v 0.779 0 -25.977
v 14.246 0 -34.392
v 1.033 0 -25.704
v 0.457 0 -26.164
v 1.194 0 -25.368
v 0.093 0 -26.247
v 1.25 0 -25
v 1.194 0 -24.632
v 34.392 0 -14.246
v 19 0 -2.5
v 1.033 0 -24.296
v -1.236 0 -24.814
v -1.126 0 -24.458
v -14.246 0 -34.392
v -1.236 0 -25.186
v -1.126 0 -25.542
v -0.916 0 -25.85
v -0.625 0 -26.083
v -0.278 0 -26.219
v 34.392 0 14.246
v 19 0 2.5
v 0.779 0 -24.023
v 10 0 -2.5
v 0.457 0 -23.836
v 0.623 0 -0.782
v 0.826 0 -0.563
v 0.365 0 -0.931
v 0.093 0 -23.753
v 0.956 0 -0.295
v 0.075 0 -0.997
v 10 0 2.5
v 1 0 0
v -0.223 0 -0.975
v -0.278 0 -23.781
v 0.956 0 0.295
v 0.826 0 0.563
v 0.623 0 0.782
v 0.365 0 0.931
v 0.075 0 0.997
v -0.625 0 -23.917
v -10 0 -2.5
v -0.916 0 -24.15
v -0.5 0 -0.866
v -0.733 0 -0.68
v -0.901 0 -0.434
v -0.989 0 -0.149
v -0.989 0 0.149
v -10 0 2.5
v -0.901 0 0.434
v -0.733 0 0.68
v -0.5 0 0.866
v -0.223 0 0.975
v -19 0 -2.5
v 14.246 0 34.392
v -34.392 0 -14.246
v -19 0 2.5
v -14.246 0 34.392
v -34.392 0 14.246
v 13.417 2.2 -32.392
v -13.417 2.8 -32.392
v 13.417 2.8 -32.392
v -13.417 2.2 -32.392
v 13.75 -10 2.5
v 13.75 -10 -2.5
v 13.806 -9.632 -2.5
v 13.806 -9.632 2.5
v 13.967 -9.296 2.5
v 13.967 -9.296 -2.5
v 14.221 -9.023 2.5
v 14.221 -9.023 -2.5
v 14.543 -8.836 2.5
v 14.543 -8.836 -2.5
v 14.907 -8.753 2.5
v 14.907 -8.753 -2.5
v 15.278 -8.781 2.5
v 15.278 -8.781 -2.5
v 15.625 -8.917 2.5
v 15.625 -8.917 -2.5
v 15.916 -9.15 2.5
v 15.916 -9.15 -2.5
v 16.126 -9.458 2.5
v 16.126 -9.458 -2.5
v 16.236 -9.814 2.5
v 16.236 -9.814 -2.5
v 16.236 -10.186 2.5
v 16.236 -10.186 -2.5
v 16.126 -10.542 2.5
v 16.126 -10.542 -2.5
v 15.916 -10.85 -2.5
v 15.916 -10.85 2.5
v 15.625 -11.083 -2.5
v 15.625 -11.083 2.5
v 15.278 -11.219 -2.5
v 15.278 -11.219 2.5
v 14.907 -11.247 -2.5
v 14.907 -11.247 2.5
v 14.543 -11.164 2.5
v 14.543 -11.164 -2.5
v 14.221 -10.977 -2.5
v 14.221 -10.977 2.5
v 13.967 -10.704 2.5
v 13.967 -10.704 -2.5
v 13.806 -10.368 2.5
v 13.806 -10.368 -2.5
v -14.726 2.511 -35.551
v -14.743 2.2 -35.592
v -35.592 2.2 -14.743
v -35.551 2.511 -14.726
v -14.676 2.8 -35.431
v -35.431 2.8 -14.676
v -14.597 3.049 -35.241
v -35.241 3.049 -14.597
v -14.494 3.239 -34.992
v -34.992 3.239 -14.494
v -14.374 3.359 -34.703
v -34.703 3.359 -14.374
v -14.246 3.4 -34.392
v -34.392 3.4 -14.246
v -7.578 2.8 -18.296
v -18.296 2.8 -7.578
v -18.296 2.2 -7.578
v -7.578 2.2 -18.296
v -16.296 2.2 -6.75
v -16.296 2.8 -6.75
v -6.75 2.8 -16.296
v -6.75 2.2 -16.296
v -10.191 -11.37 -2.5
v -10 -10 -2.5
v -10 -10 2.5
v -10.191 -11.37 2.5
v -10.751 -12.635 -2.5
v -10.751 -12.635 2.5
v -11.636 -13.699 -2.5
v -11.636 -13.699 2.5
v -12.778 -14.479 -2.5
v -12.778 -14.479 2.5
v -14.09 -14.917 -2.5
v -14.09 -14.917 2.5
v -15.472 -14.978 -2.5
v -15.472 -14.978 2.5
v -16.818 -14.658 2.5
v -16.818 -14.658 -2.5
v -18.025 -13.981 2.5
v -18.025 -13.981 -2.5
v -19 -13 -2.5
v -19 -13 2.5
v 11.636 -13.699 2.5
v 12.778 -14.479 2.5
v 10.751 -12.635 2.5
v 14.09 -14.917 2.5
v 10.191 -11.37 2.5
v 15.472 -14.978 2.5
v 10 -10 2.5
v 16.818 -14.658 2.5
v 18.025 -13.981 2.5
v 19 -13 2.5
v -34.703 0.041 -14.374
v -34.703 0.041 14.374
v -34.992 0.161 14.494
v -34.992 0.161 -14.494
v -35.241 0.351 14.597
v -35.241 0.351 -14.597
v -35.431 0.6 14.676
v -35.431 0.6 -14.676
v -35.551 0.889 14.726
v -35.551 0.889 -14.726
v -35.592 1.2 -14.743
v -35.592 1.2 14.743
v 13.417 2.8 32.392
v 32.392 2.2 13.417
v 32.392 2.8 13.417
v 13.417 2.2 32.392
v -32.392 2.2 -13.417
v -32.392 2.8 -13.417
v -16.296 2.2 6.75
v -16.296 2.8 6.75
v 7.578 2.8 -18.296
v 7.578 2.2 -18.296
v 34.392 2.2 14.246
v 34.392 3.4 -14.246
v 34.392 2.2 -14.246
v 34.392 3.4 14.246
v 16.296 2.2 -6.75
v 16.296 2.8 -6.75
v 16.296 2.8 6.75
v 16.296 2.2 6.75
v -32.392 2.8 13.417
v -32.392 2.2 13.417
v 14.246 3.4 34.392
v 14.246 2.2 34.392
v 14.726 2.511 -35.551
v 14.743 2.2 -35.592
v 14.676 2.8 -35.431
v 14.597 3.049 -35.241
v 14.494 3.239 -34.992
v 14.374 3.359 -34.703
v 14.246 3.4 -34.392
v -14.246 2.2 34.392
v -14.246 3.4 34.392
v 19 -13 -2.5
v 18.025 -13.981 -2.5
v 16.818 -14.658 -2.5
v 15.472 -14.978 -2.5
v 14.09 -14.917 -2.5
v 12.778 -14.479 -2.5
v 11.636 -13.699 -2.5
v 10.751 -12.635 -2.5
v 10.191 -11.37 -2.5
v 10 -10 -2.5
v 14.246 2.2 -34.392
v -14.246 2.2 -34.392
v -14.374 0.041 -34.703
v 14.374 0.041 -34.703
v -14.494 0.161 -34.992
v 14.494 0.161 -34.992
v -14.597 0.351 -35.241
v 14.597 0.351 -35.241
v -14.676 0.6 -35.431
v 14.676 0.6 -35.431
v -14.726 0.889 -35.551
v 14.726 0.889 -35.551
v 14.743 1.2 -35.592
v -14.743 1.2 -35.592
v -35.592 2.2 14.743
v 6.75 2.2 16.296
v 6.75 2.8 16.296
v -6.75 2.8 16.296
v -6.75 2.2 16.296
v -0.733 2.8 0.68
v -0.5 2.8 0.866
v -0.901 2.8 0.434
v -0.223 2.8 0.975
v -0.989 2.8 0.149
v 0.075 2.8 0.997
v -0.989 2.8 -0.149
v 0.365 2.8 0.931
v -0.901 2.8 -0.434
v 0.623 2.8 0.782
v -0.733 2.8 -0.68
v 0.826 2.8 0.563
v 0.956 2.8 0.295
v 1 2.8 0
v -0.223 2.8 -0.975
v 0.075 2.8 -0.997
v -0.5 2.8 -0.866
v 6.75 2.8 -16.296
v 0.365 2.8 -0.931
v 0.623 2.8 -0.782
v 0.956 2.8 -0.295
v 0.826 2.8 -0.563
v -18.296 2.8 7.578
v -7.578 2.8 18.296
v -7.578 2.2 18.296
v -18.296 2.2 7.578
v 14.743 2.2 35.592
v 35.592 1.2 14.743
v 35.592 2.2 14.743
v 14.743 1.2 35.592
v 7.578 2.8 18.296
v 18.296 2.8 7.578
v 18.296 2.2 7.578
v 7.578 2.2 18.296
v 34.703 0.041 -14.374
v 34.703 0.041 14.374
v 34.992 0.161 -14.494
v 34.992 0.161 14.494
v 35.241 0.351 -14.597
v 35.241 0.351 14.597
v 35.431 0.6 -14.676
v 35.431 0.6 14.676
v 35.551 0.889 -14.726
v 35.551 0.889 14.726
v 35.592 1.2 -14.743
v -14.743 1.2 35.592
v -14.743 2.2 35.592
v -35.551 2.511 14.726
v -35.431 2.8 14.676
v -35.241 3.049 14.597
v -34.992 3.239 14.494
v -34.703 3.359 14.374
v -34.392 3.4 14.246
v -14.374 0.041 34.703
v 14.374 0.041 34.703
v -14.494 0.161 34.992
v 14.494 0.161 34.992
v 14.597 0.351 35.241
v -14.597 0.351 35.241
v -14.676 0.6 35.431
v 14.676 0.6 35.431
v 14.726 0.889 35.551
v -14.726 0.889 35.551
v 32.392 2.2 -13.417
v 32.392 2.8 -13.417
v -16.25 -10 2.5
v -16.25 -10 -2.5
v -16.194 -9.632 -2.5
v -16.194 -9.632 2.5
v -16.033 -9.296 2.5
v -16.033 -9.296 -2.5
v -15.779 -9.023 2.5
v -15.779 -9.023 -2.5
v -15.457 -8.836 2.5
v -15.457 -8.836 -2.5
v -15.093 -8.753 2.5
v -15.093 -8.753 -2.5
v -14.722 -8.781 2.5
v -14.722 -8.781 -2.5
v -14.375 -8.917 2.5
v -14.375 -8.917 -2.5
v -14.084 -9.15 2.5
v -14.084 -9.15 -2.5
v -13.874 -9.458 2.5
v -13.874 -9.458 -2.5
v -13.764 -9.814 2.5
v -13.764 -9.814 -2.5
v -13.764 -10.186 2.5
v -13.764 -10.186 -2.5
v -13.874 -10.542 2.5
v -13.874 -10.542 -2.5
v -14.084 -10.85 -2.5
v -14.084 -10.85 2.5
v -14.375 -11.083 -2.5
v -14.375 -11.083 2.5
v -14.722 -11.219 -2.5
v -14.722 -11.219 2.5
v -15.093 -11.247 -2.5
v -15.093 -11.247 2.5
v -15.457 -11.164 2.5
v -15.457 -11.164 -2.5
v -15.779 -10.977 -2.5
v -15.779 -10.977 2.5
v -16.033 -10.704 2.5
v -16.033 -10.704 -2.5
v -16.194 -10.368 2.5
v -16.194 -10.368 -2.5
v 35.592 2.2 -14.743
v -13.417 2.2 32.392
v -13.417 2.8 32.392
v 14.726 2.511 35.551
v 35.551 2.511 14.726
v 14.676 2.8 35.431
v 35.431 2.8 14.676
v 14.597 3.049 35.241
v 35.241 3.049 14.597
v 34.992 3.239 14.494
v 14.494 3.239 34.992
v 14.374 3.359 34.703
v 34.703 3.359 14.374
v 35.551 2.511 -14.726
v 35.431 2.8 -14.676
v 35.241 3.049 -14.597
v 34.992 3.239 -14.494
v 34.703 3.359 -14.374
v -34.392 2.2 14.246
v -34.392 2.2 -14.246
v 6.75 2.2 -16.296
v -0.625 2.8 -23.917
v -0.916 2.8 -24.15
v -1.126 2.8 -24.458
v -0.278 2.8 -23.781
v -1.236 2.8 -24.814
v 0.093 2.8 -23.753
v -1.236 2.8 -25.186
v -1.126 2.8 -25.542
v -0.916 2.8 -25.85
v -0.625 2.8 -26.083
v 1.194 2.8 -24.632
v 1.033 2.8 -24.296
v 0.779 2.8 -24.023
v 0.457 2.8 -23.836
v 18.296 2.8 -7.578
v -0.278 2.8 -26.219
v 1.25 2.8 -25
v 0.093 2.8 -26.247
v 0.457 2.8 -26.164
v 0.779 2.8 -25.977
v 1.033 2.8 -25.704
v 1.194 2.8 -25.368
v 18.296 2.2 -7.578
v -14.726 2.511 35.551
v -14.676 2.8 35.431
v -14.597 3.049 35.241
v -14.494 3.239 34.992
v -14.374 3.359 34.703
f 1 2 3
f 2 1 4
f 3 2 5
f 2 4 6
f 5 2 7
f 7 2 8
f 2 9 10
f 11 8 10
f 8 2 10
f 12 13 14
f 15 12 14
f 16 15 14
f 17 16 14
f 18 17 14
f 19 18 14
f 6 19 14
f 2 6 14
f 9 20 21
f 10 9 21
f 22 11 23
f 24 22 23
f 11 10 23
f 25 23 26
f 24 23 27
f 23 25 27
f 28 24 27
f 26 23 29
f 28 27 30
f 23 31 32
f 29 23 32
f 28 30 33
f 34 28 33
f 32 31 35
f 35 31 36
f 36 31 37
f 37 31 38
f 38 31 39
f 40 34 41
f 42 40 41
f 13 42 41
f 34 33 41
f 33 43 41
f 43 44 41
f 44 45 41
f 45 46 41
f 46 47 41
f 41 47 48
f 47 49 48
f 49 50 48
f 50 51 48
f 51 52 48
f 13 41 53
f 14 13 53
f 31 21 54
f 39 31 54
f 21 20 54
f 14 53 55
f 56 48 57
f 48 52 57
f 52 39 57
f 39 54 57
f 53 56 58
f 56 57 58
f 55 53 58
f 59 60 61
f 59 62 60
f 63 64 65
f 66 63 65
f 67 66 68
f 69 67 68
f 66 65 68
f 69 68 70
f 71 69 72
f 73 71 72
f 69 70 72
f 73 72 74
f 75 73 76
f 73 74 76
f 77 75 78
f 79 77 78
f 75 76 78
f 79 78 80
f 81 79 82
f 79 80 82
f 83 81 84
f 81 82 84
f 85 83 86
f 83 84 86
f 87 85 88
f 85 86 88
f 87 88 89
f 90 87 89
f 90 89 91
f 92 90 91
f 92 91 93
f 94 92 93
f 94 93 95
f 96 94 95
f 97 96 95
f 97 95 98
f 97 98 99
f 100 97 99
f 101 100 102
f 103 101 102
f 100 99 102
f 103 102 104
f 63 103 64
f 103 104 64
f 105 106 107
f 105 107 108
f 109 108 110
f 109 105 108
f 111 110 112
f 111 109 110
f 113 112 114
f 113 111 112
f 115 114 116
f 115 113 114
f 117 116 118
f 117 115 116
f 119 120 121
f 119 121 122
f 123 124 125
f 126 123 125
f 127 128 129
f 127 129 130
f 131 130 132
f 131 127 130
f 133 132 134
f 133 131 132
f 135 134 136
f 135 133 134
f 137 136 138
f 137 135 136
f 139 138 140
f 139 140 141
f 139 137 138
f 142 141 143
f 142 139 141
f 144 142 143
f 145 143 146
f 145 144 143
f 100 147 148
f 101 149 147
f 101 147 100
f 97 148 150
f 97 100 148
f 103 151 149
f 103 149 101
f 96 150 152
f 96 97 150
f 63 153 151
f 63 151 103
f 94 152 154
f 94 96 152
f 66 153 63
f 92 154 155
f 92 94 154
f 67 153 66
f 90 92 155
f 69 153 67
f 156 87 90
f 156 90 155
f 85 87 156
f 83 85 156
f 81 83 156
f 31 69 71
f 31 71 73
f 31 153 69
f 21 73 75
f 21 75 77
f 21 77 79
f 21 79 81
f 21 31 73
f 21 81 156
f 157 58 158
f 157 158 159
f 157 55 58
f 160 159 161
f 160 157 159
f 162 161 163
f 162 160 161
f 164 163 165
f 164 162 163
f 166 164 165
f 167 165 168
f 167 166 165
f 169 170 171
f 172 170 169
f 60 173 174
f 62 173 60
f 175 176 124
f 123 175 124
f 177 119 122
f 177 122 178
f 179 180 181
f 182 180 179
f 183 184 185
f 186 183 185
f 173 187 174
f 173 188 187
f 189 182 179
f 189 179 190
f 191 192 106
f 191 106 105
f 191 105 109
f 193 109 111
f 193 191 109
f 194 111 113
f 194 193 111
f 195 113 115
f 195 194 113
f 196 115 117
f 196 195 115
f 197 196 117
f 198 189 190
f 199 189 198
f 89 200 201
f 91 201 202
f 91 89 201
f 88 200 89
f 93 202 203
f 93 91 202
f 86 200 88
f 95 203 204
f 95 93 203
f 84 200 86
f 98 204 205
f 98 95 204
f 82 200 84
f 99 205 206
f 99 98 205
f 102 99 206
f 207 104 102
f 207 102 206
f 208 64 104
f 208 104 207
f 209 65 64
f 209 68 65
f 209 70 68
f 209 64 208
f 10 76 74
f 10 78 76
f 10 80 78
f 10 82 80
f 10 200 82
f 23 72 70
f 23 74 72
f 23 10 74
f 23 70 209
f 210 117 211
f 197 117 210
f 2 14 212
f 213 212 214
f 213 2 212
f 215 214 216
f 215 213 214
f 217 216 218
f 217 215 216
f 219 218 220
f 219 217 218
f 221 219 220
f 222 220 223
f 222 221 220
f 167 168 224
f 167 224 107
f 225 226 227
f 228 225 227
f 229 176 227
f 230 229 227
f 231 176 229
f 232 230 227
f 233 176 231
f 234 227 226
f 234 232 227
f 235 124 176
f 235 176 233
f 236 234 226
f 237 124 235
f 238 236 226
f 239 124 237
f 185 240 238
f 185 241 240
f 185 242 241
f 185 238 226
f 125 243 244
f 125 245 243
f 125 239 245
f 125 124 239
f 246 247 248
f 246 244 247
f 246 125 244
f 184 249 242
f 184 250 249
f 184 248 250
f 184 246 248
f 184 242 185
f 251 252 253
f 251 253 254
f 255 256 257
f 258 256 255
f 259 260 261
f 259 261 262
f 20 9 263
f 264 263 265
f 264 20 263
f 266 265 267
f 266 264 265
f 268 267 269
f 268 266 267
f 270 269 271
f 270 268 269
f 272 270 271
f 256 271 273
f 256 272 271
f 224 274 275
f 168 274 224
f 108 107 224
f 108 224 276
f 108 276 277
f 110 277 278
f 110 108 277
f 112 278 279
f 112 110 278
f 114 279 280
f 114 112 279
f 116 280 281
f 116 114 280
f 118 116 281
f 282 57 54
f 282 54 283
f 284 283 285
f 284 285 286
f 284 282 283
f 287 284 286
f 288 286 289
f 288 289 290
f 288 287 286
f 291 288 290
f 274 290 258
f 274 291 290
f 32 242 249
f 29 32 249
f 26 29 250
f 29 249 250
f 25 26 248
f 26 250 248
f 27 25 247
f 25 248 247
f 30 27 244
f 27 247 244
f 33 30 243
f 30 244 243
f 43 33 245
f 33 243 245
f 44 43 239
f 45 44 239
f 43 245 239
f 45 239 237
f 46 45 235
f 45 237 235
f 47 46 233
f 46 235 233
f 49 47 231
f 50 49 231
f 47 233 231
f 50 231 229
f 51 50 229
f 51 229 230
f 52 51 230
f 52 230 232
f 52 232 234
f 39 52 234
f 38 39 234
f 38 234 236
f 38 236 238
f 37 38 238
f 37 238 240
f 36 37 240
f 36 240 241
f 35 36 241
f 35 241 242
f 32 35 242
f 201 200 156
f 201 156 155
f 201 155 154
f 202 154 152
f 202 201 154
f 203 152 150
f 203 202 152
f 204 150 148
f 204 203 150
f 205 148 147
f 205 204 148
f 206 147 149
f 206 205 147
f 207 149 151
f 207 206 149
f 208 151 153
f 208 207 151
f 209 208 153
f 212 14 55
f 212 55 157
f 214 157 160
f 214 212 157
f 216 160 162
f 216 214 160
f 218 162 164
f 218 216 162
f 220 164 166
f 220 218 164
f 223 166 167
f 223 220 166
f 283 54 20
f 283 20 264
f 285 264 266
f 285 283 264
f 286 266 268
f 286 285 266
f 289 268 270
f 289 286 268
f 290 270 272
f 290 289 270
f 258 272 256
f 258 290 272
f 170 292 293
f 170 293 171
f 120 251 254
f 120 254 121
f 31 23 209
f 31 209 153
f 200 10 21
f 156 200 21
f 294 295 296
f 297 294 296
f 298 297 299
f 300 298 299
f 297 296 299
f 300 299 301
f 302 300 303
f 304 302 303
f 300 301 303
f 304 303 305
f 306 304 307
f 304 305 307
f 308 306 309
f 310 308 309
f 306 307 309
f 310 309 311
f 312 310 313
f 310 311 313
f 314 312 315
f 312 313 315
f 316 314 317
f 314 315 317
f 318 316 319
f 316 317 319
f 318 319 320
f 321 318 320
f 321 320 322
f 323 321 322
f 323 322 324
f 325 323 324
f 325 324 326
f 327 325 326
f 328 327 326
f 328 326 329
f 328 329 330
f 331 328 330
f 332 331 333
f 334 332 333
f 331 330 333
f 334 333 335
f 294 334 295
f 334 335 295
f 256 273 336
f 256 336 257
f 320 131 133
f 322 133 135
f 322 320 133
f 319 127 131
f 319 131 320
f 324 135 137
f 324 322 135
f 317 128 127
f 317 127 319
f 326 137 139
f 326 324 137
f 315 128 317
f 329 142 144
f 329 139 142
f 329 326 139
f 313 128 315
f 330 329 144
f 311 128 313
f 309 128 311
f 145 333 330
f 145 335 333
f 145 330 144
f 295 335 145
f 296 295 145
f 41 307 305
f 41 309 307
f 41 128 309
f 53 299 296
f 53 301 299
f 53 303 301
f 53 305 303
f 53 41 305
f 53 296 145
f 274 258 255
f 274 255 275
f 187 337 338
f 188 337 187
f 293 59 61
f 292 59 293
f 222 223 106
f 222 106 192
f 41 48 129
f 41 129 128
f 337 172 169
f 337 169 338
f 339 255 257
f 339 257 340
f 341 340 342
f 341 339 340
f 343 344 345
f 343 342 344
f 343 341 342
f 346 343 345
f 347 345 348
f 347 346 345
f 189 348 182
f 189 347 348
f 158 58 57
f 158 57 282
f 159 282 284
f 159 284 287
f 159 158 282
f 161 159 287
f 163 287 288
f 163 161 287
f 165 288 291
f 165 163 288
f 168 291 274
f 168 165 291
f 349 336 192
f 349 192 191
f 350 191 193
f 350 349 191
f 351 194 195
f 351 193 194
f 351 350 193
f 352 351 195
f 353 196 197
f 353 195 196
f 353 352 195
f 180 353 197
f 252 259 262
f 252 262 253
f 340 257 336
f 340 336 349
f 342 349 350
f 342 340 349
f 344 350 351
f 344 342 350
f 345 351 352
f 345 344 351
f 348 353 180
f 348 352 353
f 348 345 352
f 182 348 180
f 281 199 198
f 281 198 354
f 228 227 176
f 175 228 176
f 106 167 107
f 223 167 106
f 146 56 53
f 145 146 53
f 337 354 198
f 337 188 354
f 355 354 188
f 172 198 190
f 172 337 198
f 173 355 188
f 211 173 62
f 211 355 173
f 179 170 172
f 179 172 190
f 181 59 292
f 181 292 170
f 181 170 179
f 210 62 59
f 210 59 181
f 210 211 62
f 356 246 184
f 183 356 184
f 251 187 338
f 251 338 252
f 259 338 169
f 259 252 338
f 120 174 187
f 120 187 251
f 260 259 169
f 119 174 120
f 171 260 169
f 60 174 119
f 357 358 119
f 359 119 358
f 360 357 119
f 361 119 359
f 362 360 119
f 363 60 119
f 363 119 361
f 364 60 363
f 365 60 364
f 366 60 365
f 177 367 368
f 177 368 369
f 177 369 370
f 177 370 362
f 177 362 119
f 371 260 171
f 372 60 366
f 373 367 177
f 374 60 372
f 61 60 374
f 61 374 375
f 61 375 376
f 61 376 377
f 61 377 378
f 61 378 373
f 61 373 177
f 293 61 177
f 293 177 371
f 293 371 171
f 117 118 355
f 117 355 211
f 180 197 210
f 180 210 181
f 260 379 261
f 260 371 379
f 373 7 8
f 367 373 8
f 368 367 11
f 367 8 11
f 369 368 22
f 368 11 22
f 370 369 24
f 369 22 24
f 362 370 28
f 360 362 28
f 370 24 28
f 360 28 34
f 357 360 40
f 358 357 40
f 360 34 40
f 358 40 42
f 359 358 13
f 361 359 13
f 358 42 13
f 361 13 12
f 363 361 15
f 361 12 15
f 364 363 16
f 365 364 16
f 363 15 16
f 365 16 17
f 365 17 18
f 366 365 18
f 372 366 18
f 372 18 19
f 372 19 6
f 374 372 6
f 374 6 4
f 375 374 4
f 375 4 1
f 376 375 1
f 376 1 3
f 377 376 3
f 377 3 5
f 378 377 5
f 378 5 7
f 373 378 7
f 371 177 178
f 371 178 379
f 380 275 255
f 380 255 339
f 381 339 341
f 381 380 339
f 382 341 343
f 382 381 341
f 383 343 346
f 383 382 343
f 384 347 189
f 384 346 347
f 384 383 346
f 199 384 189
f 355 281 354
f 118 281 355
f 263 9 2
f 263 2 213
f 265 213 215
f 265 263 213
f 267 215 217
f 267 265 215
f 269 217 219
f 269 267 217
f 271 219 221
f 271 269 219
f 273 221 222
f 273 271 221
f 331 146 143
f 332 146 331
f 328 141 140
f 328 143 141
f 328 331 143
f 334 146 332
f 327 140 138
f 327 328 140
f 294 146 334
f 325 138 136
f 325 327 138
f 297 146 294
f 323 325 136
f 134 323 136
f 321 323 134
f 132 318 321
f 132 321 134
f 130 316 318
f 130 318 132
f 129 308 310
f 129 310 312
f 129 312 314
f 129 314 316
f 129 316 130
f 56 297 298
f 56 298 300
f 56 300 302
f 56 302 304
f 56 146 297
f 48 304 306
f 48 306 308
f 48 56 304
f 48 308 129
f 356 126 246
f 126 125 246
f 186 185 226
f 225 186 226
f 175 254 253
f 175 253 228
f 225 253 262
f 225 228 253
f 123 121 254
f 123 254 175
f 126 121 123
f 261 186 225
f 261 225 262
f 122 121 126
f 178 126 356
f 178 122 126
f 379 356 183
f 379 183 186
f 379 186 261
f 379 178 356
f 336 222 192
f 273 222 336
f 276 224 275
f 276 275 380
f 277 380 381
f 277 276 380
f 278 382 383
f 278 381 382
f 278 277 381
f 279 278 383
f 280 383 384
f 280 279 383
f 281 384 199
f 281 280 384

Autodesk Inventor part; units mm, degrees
ref_plane "YZ Plane" through (0, 0, 0) normal (1, 0, 0) x (0, 1, 0)
ref_plane "XZ Plane" through (0, 0, 0) normal (0, 1, 0) x (-1, 0, 0)
ref_plane "XY Plane" through (0, 0, 0) normal (0, 0, 1) x (1, 0, 0)
sketch "스케치3" plane through (0, 0, 0) normal (0, 1, 0) x (-1, 0, 0)
  line L0 (35.5919, -14.7426) -> (14.7426, -35.5919)
  line L1 (14.7426, -35.5919) -> (-14.7426, -35.5919)
  line L2 (-14.7426, -35.5919) -> (-35.5919, -14.7426)
  line L3 (-35.5919, -14.7426) -> (-35.5919, 14.7426)
  line L4 (-35.5919, 14.7426) -> (-14.7426, 35.5919)
  line L5 (-14.7426, 35.5919) -> (14.7426, 35.5919)
  line L6 (14.7426, 35.5919) -> (35.5919, 14.7426)
  line L7 (35.5919, 14.7426) -> (35.5919, -14.7426)
  line L8 (32.5919, -13.5) -> (13.5, -32.5919)
  line L9 (13.5, -32.5919) -> (-13.5, -32.5919)
  line L10 (-13.5, -32.5919) -> (-32.5919, -13.5)
  line L11 (-32.5919, -13.5) -> (-32.5919, 13.5)
  line L12 (-32.5919, 13.5) -> (-13.5, 32.5919)
  line L13 (-13.5, 32.5919) -> (13.5, 32.5919)
  line L14 (13.5, 32.5919) -> (32.5919, 13.5)
  line L15 (32.5919, 13.5) -> (32.5919, -13.5)
  point P0 (0, 0)
  point P1 (0, 0)
  point P2 (0, 0)
  point P3 (0, 0)
  dimension "d43" = 27
  dimension "d44" = 3
extrude "돌출2" add sketch "스케치3" along normal blind 3.4 contours L0 L1 L2 L3 L4 L5 L6 L7 | L8 L9 L10 L11 L12 L13 L14 L15
sketch "스케치4" plane through (0, 3.4, 0) normal (0, 1, 0) x (1, 0, 0)
  line L0 (13.5, -32.5919) -> (-13.5, -32.5919)
  line L1 (-13.5, -32.5919) -> (-32.5919, -13.5)
  line L2 (-32.5919, -13.5) -> (-32.5919, 13.5)
  line L3 (-32.5919, 13.5) -> (-13.5, 32.5919)
  line L4 (-13.5, 32.5919) -> (13.5, 32.5919)
  line L5 (13.5, 32.5919) -> (32.5919, 13.5)
  line L6 (32.5919, 13.5) -> (32.5919, -13.5)
  line L7 (32.5919, -13.5) -> (13.5, -32.5919)
  line L8 (-14.2456, 34.3919) -> (14.2456, 34.3919)
  line L9 (14.2456, 34.3919) -> (34.3919, 14.2456)
  line L10 (34.3919, 14.2456) -> (34.3919, -14.2456)
  line L11 (34.3919, -14.2456) -> (14.2456, -34.3919)
  line L12 (14.2456, -34.3919) -> (-14.2456, -34.3919)
  line L13 (-14.2456, -34.3919) -> (-34.3919, -14.2456)
  line L14 (-34.3919, -14.2456) -> (-34.3919, 14.2456)
  line L15 (-34.3919, 14.2456) -> (-14.2456, 34.3919)
  line L16 (-13.4172, 32.3919) -> (13.4172, 32.3919)
  line L17 (13.4172, 32.3919) -> (32.3919, 13.4172)
  line L18 (32.3919, 13.4172) -> (32.3919, -13.4172)
  line L19 (32.3919, -13.4172) -> (13.4172, -32.3919)
  line L20 (13.4172, -32.3919) -> (-13.4172, -32.3919)
  line L21 (-13.4172, -32.3919) -> (-32.3919, -13.4172)
  line L22 (-32.3919, -13.4172) -> (-32.3919, 13.4172)
  line L23 (-32.3919, 13.4172) -> (-13.4172, 32.3919)
  point P0 (0, 0)
  point P1 (0, 0)
  point P2 (0, 0)
  point P3 (0, 0)
  dimension "d7" = 27
  dimension "d42" = 1.8
  dimension "d45" = 0.2
extrude "돌출3" cut sketch "스케치4" against normal blind 1.2 contours L0 L1 L2 L3 L4 L5 L6 L7 | L8 L9 L10 L11 L12 L13 L14 L15 | L16 L17 L18 L19 L20 L21 L22 L23
sketch "스케치5" plane through (0, 0, 0) normal (0, -1, 0) x (1, 0, 0)
  line L0 (10, 2.5) -> (20, 2.5)
  line L1 (20, 2.5) -> (20, -2.5)
  line L2 (20, -2.5) -> (10, -2.5)
  line L3 (10, -2.5) -> (10, 2.5)
  line L4 (10, 2.5) -> (20, -2.5) construction
  line L5 (20, 2.5) -> (10, -2.5) construction
  line L6 (-20, 2.5) -> (-10, 2.5)
  line L7 (-10, 2.5) -> (-10, -2.5)
  line L8 (-10, -2.5) -> (-20, -2.5)
  line L9 (-20, -2.5) -> (-20, 2.5)
  line L10 (-20, 2.5) -> (-10, -2.5) construction
  line L11 (-10, 2.5) -> (-20, -2.5) construction
  point P0 (0, 0)
  point P1 (15, 0)
  point P2 (-15, 0)
  dimension "d11" = 10
  dimension "d12" = 5
  dimension "d13" = 10
  dimension "d16" = 30
extrude "돌출4" add sketch "스케치5" along normal blind 10
sketch "스케치6" plane through (-10, 0, -2.5) normal (0, 0, -1) x (-1, 0, 0)
  circle A0 centre (5, -10) radius 5
  circle A1 centre (-25, -10) radius 5
  line L0 (-20, -10) -> (-30, -10) projected
  line L1 (10, -10) -> (0, -10) projected
  point P0 (-10, 0)
  dimension "d23" = 10
  dimension "d24" = 10
extrude "돌출5" add sketch "스케치6" against normal blind 5
sketch "스케치7" plane through (-10, 0, -2.5) normal (0, 0, -1) x (-1, 0, 0)
  circle A0 centre (5, -10) radius 1.25
  line L0 (10, 0) -> (10, -10) projected
  line L1 (0, 0) -> (10, 0) projected
  line L2 (4.7788, 0) -> (0, 0)
  circle A1 centre (-25, -10) radius 1.25
  point P0 (-10, 0)
  dimension "d27" = 2.5
  dimension "d28" = 5
  dimension "d31" = 30
extrude "돌출6" cut sketch "스케치7" against normal blind 5
sketch "스케치8" plane through (0, 0, 0) normal (0, -1, 0) x (1, 0, 0)
  circle A0 centre (0, -25) radius 1.25
  line L0 (-10, 2.5) -> (-10, -2.5) projected
  point P0 (0, 0)
  point P1 (-10, 0)
  dimension "d38" = 2.5
  dimension "d39" = 25
sketch "스케치9" plane through (0, 2.2, 0) normal (0, 1, 0) x (1, 0, 0)
  line L0 (-13.4172, 32.3919) -> (13.4172, 32.3919)
  line L1 (13.4172, 32.3919) -> (32.3919, 13.4172)
  line L2 (32.3919, 13.4172) -> (32.3919, -13.4172)
  line L3 (32.3919, -13.4172) -> (13.4172, -32.3919)
  line L4 (13.4172, -32.3919) -> (-13.4172, -32.3919)
  line L5 (-13.4172, -32.3919) -> (-32.3919, -13.4172)
  line L6 (-32.3919, -13.4172) -> (-32.3919, 13.4172)
  line L7 (-32.3919, 13.4172) -> (-13.4172, 32.3919)
  line L8 (-14.2456, 34.3919) -> (14.2456, 34.3919) projected
  line L9 (-12.1745, 29.3919) -> (12.1745, 29.3919)
  line L10 (12.1745, 29.3919) -> (29.3919, 12.1745)
  line L11 (29.3919, 12.1745) -> (29.3919, -12.1745)
  line L12 (29.3919, -12.1745) -> (12.1745, -29.3919)
  line L13 (12.1745, -29.3919) -> (-12.1745, -29.3919)
  line L14 (-12.1745, -29.3919) -> (-29.3919, -12.1745)
  line L15 (-29.3919, -12.1745) -> (-29.3919, 12.1745)
  line L16 (-29.3919, 12.1745) -> (-12.1745, 29.3919)
  point P0 (0, 0)
  point P1 (0, 0)
  point P2 (0, 0)
  dimension "d46" = 2
  dimension "d47" = 3
extrude "돌출8" add sketch "스케치9" along normal blind 0.6 contours L0 L1 L2 L3 L4 L5 L6 L7 | L9 L10 L11 L12 L13 L14 L15 L16
fillet "모깎기1" radius 1.2 16 edges at (-35.5919, 3.4, 0) (-25.1673, 3.4, 25.1673) (0, 3.4, 35.5919) (25.1673, 3.4, 25.1673) (35.5919, 3.4, 0) (25.1673, 3.4, -25.1673) (0, 3.4, -35.5919) (-25.1673, 3.4, -25.1673) (25.1673, 0, 25.1673) (0, 0, 35.5919) (-25.1673, 0, 25.1673) (-35.5919, 0, 0) (-25.1673, 0, -25.1673) (0, 0, -35.5919) (25.1673, 0, -25.1673) (35.5919, 0, 0)
sketch "스케치10" plane through (0, 0, 0) normal (0, -1, 0) x (1, 0, 0)
  line L0 (-20, 2.5) -> (-10, 2.5) projected
  line L1 (-10, -2.5) -> (-20, -2.5) projected
  line L2 (-20, 2.5) -> (-19, 2.5)
  line L3 (-19, 2.5) -> (-19, -2.5)
  line L4 (-19, -2.5) -> (-20, -2.5)
  line L5 (-20, -2.5) -> (-20, 2.5)
  line L6 (20, -2.5) -> (10, -2.5) projected
  line L7 (10, 2.5) -> (20, 2.5) projected
  line L8 (20, -2.5) -> (19, -2.5)
  line L9 (19, -2.5) -> (19, 2.5)
  line L10 (19, 2.5) -> (20, 2.5)
  line L11 (20, 2.5) -> (20, -2.5)
  point P0 (0, 0)
  dimension "d54" = 1
  dimension "d55" = 1
extrude "돌출9" cut sketch "스케치10" along normal blind 15
extrude "돌출10" cut sketch "스케치8" against normal blind 5
sketch "스케치11" plane through (0, 2.8, 0) normal (0, 1, 0) x (1, 0, 0)
  line L0 (-6.75, 16.2959) -> (6.75, 16.2959)
  line L1 (6.75, 16.2959) -> (16.2959, 6.75)
  line L2 (16.2959, 6.75) -> (16.2959, -6.75)
  line L3 (16.2959, -6.75) -> (6.75, -16.2959)
  line L4 (6.75, -16.2959) -> (-6.75, -16.2959)
  line L5 (-6.75, -16.2959) -> (-16.2959, -6.75)
  line L6 (-16.2959, -6.75) -> (-16.2959, 6.75)
  line L7 (-16.2959, 6.75) -> (-6.75, 16.2959)
  line L8 (-7.5784, 18.2959) -> (7.5784, 18.2959)
  line L9 (7.5784, 18.2959) -> (18.2959, 7.5784)
  line L10 (18.2959, 7.5784) -> (18.2959, -7.5784)
  line L11 (18.2959, -7.5784) -> (7.5784, -18.2959)
  line L12 (7.5784, -18.2959) -> (-7.5784, -18.2959)
  line L13 (-7.5784, -18.2959) -> (-18.2959, -7.5784)
  line L14 (-18.2959, -7.5784) -> (-18.2959, 7.5784)
  line L15 (-18.2959, 7.5784) -> (-7.5784, 18.2959)
  point P0 (0, 0)
  point P1 (0, 0)
  point P2 (0, 0)
  point P3 (0, 18.2959)
  dimension "d60" = 13.5
  dimension "d61" = 2
extrude "돌출11" cut sketch "스케치11" against normal blind 0.6
sketch "스케치12" plane through (0, 2.8, 0) normal (0, 1, 0) x (1, 0, 0)
  circle A0 centre (0, 0) radius 1
  dimension "d64" = 2
extrude "돌출12" cut sketch "스케치12" against normal up to surface (2.8 mm away)
equation "\"d55\" = d54"
properties part number "OV-PAM_top_2"
